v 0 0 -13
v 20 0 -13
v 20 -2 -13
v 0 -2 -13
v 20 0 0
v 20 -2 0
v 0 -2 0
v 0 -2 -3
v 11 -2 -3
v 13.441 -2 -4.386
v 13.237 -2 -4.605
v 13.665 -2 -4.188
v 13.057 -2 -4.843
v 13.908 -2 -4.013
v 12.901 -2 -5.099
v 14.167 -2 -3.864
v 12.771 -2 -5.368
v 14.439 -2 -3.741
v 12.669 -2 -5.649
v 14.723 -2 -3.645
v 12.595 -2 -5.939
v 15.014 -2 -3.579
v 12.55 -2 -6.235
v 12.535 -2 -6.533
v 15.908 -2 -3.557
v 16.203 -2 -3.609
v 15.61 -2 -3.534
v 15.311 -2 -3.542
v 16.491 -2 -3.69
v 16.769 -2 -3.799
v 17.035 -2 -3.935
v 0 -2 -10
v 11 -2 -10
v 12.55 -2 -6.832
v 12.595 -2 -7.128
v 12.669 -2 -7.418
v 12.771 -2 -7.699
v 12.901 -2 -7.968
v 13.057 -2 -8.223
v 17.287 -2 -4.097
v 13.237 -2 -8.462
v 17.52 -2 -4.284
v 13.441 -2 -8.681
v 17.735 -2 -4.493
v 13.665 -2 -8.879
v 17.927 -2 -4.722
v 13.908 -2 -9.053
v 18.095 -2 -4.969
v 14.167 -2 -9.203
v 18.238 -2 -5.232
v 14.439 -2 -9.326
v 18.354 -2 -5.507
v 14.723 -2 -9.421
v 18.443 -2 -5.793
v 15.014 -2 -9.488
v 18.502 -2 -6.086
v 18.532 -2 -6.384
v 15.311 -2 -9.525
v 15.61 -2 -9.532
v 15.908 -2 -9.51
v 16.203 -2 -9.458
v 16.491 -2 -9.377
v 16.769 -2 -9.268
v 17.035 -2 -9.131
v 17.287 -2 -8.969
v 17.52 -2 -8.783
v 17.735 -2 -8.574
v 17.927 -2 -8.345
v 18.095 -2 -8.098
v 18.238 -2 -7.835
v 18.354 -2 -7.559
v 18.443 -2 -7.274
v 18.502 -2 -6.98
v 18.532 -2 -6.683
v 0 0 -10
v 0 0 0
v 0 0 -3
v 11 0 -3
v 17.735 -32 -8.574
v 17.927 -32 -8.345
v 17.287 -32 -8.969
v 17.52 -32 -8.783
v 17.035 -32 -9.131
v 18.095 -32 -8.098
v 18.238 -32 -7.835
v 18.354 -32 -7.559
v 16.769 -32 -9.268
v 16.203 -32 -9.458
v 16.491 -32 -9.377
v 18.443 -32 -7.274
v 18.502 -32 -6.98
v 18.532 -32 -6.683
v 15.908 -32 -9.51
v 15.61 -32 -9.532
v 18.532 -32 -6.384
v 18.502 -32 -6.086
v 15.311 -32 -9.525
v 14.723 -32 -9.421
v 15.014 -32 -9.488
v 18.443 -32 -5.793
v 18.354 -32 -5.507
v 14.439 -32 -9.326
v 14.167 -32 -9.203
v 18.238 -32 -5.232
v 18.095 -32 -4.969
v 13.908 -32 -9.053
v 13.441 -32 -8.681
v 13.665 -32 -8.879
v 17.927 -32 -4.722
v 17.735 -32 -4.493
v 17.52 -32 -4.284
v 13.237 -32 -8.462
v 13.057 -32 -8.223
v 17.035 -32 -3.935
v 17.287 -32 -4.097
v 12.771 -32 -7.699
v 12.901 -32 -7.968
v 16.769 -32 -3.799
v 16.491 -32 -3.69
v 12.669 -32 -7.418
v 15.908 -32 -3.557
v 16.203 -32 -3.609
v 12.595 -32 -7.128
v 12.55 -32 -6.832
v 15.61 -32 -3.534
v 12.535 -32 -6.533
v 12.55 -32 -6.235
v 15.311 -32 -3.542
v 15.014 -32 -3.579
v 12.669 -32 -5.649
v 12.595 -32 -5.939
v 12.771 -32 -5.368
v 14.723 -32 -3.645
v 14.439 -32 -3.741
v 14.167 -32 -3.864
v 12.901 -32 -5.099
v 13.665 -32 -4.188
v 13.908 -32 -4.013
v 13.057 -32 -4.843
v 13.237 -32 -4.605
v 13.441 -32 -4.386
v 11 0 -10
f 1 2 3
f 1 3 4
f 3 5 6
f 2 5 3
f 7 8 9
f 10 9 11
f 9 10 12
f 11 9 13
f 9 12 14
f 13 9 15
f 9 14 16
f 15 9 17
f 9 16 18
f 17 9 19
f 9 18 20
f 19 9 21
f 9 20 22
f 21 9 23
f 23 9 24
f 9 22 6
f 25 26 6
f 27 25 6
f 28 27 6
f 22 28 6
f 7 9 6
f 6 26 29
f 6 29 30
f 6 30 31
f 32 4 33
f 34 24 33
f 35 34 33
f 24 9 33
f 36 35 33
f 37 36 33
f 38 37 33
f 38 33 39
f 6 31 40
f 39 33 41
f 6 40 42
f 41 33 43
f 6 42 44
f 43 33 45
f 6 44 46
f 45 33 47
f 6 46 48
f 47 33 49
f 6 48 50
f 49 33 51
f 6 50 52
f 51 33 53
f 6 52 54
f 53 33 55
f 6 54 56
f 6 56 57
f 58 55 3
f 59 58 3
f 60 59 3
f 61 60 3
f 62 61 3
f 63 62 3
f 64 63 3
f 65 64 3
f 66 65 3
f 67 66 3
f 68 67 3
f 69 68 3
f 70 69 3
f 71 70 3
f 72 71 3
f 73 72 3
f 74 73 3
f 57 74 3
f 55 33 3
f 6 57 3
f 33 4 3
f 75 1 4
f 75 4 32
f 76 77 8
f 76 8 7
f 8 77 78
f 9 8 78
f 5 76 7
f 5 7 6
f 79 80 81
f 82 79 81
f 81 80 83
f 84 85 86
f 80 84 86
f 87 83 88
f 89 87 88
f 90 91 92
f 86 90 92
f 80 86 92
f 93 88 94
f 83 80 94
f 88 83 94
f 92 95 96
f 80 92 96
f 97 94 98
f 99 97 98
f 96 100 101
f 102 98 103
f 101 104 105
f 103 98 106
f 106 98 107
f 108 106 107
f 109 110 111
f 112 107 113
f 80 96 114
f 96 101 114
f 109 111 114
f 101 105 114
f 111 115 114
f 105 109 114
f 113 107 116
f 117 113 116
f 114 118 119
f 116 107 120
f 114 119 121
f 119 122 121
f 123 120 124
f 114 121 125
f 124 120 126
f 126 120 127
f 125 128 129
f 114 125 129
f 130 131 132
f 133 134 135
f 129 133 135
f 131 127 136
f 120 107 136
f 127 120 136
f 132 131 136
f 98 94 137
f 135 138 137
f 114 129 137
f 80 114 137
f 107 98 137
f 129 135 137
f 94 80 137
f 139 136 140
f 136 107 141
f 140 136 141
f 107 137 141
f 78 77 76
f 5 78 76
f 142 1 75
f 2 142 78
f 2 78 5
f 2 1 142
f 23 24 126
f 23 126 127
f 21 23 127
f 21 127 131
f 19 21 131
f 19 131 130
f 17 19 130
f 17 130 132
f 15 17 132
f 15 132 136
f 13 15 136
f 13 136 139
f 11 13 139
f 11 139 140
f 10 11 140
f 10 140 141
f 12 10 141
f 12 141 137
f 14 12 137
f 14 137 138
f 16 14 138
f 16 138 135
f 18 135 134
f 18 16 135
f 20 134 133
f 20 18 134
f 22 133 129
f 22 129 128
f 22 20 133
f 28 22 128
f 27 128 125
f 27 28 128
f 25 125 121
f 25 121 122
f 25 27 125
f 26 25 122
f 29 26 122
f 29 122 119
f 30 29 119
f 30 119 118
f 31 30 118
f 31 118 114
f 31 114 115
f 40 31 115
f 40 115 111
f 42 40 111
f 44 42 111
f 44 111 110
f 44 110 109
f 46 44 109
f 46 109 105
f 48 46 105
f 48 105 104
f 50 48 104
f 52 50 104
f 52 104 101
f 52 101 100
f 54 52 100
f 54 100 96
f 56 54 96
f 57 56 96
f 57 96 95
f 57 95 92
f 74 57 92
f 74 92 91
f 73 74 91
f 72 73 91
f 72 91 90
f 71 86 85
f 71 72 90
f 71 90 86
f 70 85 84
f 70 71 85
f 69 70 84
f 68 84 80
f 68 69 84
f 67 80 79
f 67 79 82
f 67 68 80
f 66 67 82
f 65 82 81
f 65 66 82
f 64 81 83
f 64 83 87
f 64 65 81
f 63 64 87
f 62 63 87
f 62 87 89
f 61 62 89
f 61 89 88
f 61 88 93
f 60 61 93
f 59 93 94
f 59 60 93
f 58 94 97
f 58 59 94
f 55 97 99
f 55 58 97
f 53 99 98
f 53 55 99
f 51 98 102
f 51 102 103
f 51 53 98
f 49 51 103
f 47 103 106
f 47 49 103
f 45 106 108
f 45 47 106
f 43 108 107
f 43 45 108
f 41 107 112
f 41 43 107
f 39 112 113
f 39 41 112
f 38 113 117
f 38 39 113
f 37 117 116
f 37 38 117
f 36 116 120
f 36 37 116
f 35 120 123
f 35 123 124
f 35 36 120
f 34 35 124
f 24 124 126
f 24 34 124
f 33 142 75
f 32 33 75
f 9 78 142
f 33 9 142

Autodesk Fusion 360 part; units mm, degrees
sketch "Sketch1" plane through (0, 0, 0) normal (0, 1, 0) x (1, 0, 0)
  line L0 (0, 0) -> (20, 0)
  line L1 (20, 0) -> (20, 13)
  line L2 (20, 13) -> (0, 13)
  line L3 (0, 3) -> (11, 3)
  line L4 (11, 3) -> (11, 10)
  line L5 (11, 10) -> (0, 10)
  line L6 (0, 13) -> (0, 10)
  line L7 (0, 3) -> (0, 0)
  circle A0 centre (15.5354, 6.5333) radius 3
  dimension "d2" = 6
sketch "Sketch2" plane through (0, 0, 0) normal (0, 1, 0) x (-1, 0, 0)
  line L0 (0, -3) -> (-11, -3)
  line L1 (-20, -13) -> (0, -13)
  circle A0 centre (-15.5354, -6.5333) radius 3
  dimension "d3" = 11
  dimension "d4" = 20
  dimension "d5" = 6
extrude "Extrude1" add sketch "Sketch2" against normal blind 22
extrude "Extrude2" add sketch "Sketch1" against normal blind 2
sketch "Sketch3" plane through (20, 0, 0) normal (1, 0, 0) x (0, 1, 0)
  line L0 (0, -13) -> (0, 0)
  line L1 (0, 0) -> (-2, 0)
  line L2 (-2, 0) -> (-2, -13)
  line L3 (-2, -13) -> (0, -13)
extrude "Extrude3" add 1 faces at (15.9008, -22, -5.6024) along direction (0, -1, 0) blind 10
